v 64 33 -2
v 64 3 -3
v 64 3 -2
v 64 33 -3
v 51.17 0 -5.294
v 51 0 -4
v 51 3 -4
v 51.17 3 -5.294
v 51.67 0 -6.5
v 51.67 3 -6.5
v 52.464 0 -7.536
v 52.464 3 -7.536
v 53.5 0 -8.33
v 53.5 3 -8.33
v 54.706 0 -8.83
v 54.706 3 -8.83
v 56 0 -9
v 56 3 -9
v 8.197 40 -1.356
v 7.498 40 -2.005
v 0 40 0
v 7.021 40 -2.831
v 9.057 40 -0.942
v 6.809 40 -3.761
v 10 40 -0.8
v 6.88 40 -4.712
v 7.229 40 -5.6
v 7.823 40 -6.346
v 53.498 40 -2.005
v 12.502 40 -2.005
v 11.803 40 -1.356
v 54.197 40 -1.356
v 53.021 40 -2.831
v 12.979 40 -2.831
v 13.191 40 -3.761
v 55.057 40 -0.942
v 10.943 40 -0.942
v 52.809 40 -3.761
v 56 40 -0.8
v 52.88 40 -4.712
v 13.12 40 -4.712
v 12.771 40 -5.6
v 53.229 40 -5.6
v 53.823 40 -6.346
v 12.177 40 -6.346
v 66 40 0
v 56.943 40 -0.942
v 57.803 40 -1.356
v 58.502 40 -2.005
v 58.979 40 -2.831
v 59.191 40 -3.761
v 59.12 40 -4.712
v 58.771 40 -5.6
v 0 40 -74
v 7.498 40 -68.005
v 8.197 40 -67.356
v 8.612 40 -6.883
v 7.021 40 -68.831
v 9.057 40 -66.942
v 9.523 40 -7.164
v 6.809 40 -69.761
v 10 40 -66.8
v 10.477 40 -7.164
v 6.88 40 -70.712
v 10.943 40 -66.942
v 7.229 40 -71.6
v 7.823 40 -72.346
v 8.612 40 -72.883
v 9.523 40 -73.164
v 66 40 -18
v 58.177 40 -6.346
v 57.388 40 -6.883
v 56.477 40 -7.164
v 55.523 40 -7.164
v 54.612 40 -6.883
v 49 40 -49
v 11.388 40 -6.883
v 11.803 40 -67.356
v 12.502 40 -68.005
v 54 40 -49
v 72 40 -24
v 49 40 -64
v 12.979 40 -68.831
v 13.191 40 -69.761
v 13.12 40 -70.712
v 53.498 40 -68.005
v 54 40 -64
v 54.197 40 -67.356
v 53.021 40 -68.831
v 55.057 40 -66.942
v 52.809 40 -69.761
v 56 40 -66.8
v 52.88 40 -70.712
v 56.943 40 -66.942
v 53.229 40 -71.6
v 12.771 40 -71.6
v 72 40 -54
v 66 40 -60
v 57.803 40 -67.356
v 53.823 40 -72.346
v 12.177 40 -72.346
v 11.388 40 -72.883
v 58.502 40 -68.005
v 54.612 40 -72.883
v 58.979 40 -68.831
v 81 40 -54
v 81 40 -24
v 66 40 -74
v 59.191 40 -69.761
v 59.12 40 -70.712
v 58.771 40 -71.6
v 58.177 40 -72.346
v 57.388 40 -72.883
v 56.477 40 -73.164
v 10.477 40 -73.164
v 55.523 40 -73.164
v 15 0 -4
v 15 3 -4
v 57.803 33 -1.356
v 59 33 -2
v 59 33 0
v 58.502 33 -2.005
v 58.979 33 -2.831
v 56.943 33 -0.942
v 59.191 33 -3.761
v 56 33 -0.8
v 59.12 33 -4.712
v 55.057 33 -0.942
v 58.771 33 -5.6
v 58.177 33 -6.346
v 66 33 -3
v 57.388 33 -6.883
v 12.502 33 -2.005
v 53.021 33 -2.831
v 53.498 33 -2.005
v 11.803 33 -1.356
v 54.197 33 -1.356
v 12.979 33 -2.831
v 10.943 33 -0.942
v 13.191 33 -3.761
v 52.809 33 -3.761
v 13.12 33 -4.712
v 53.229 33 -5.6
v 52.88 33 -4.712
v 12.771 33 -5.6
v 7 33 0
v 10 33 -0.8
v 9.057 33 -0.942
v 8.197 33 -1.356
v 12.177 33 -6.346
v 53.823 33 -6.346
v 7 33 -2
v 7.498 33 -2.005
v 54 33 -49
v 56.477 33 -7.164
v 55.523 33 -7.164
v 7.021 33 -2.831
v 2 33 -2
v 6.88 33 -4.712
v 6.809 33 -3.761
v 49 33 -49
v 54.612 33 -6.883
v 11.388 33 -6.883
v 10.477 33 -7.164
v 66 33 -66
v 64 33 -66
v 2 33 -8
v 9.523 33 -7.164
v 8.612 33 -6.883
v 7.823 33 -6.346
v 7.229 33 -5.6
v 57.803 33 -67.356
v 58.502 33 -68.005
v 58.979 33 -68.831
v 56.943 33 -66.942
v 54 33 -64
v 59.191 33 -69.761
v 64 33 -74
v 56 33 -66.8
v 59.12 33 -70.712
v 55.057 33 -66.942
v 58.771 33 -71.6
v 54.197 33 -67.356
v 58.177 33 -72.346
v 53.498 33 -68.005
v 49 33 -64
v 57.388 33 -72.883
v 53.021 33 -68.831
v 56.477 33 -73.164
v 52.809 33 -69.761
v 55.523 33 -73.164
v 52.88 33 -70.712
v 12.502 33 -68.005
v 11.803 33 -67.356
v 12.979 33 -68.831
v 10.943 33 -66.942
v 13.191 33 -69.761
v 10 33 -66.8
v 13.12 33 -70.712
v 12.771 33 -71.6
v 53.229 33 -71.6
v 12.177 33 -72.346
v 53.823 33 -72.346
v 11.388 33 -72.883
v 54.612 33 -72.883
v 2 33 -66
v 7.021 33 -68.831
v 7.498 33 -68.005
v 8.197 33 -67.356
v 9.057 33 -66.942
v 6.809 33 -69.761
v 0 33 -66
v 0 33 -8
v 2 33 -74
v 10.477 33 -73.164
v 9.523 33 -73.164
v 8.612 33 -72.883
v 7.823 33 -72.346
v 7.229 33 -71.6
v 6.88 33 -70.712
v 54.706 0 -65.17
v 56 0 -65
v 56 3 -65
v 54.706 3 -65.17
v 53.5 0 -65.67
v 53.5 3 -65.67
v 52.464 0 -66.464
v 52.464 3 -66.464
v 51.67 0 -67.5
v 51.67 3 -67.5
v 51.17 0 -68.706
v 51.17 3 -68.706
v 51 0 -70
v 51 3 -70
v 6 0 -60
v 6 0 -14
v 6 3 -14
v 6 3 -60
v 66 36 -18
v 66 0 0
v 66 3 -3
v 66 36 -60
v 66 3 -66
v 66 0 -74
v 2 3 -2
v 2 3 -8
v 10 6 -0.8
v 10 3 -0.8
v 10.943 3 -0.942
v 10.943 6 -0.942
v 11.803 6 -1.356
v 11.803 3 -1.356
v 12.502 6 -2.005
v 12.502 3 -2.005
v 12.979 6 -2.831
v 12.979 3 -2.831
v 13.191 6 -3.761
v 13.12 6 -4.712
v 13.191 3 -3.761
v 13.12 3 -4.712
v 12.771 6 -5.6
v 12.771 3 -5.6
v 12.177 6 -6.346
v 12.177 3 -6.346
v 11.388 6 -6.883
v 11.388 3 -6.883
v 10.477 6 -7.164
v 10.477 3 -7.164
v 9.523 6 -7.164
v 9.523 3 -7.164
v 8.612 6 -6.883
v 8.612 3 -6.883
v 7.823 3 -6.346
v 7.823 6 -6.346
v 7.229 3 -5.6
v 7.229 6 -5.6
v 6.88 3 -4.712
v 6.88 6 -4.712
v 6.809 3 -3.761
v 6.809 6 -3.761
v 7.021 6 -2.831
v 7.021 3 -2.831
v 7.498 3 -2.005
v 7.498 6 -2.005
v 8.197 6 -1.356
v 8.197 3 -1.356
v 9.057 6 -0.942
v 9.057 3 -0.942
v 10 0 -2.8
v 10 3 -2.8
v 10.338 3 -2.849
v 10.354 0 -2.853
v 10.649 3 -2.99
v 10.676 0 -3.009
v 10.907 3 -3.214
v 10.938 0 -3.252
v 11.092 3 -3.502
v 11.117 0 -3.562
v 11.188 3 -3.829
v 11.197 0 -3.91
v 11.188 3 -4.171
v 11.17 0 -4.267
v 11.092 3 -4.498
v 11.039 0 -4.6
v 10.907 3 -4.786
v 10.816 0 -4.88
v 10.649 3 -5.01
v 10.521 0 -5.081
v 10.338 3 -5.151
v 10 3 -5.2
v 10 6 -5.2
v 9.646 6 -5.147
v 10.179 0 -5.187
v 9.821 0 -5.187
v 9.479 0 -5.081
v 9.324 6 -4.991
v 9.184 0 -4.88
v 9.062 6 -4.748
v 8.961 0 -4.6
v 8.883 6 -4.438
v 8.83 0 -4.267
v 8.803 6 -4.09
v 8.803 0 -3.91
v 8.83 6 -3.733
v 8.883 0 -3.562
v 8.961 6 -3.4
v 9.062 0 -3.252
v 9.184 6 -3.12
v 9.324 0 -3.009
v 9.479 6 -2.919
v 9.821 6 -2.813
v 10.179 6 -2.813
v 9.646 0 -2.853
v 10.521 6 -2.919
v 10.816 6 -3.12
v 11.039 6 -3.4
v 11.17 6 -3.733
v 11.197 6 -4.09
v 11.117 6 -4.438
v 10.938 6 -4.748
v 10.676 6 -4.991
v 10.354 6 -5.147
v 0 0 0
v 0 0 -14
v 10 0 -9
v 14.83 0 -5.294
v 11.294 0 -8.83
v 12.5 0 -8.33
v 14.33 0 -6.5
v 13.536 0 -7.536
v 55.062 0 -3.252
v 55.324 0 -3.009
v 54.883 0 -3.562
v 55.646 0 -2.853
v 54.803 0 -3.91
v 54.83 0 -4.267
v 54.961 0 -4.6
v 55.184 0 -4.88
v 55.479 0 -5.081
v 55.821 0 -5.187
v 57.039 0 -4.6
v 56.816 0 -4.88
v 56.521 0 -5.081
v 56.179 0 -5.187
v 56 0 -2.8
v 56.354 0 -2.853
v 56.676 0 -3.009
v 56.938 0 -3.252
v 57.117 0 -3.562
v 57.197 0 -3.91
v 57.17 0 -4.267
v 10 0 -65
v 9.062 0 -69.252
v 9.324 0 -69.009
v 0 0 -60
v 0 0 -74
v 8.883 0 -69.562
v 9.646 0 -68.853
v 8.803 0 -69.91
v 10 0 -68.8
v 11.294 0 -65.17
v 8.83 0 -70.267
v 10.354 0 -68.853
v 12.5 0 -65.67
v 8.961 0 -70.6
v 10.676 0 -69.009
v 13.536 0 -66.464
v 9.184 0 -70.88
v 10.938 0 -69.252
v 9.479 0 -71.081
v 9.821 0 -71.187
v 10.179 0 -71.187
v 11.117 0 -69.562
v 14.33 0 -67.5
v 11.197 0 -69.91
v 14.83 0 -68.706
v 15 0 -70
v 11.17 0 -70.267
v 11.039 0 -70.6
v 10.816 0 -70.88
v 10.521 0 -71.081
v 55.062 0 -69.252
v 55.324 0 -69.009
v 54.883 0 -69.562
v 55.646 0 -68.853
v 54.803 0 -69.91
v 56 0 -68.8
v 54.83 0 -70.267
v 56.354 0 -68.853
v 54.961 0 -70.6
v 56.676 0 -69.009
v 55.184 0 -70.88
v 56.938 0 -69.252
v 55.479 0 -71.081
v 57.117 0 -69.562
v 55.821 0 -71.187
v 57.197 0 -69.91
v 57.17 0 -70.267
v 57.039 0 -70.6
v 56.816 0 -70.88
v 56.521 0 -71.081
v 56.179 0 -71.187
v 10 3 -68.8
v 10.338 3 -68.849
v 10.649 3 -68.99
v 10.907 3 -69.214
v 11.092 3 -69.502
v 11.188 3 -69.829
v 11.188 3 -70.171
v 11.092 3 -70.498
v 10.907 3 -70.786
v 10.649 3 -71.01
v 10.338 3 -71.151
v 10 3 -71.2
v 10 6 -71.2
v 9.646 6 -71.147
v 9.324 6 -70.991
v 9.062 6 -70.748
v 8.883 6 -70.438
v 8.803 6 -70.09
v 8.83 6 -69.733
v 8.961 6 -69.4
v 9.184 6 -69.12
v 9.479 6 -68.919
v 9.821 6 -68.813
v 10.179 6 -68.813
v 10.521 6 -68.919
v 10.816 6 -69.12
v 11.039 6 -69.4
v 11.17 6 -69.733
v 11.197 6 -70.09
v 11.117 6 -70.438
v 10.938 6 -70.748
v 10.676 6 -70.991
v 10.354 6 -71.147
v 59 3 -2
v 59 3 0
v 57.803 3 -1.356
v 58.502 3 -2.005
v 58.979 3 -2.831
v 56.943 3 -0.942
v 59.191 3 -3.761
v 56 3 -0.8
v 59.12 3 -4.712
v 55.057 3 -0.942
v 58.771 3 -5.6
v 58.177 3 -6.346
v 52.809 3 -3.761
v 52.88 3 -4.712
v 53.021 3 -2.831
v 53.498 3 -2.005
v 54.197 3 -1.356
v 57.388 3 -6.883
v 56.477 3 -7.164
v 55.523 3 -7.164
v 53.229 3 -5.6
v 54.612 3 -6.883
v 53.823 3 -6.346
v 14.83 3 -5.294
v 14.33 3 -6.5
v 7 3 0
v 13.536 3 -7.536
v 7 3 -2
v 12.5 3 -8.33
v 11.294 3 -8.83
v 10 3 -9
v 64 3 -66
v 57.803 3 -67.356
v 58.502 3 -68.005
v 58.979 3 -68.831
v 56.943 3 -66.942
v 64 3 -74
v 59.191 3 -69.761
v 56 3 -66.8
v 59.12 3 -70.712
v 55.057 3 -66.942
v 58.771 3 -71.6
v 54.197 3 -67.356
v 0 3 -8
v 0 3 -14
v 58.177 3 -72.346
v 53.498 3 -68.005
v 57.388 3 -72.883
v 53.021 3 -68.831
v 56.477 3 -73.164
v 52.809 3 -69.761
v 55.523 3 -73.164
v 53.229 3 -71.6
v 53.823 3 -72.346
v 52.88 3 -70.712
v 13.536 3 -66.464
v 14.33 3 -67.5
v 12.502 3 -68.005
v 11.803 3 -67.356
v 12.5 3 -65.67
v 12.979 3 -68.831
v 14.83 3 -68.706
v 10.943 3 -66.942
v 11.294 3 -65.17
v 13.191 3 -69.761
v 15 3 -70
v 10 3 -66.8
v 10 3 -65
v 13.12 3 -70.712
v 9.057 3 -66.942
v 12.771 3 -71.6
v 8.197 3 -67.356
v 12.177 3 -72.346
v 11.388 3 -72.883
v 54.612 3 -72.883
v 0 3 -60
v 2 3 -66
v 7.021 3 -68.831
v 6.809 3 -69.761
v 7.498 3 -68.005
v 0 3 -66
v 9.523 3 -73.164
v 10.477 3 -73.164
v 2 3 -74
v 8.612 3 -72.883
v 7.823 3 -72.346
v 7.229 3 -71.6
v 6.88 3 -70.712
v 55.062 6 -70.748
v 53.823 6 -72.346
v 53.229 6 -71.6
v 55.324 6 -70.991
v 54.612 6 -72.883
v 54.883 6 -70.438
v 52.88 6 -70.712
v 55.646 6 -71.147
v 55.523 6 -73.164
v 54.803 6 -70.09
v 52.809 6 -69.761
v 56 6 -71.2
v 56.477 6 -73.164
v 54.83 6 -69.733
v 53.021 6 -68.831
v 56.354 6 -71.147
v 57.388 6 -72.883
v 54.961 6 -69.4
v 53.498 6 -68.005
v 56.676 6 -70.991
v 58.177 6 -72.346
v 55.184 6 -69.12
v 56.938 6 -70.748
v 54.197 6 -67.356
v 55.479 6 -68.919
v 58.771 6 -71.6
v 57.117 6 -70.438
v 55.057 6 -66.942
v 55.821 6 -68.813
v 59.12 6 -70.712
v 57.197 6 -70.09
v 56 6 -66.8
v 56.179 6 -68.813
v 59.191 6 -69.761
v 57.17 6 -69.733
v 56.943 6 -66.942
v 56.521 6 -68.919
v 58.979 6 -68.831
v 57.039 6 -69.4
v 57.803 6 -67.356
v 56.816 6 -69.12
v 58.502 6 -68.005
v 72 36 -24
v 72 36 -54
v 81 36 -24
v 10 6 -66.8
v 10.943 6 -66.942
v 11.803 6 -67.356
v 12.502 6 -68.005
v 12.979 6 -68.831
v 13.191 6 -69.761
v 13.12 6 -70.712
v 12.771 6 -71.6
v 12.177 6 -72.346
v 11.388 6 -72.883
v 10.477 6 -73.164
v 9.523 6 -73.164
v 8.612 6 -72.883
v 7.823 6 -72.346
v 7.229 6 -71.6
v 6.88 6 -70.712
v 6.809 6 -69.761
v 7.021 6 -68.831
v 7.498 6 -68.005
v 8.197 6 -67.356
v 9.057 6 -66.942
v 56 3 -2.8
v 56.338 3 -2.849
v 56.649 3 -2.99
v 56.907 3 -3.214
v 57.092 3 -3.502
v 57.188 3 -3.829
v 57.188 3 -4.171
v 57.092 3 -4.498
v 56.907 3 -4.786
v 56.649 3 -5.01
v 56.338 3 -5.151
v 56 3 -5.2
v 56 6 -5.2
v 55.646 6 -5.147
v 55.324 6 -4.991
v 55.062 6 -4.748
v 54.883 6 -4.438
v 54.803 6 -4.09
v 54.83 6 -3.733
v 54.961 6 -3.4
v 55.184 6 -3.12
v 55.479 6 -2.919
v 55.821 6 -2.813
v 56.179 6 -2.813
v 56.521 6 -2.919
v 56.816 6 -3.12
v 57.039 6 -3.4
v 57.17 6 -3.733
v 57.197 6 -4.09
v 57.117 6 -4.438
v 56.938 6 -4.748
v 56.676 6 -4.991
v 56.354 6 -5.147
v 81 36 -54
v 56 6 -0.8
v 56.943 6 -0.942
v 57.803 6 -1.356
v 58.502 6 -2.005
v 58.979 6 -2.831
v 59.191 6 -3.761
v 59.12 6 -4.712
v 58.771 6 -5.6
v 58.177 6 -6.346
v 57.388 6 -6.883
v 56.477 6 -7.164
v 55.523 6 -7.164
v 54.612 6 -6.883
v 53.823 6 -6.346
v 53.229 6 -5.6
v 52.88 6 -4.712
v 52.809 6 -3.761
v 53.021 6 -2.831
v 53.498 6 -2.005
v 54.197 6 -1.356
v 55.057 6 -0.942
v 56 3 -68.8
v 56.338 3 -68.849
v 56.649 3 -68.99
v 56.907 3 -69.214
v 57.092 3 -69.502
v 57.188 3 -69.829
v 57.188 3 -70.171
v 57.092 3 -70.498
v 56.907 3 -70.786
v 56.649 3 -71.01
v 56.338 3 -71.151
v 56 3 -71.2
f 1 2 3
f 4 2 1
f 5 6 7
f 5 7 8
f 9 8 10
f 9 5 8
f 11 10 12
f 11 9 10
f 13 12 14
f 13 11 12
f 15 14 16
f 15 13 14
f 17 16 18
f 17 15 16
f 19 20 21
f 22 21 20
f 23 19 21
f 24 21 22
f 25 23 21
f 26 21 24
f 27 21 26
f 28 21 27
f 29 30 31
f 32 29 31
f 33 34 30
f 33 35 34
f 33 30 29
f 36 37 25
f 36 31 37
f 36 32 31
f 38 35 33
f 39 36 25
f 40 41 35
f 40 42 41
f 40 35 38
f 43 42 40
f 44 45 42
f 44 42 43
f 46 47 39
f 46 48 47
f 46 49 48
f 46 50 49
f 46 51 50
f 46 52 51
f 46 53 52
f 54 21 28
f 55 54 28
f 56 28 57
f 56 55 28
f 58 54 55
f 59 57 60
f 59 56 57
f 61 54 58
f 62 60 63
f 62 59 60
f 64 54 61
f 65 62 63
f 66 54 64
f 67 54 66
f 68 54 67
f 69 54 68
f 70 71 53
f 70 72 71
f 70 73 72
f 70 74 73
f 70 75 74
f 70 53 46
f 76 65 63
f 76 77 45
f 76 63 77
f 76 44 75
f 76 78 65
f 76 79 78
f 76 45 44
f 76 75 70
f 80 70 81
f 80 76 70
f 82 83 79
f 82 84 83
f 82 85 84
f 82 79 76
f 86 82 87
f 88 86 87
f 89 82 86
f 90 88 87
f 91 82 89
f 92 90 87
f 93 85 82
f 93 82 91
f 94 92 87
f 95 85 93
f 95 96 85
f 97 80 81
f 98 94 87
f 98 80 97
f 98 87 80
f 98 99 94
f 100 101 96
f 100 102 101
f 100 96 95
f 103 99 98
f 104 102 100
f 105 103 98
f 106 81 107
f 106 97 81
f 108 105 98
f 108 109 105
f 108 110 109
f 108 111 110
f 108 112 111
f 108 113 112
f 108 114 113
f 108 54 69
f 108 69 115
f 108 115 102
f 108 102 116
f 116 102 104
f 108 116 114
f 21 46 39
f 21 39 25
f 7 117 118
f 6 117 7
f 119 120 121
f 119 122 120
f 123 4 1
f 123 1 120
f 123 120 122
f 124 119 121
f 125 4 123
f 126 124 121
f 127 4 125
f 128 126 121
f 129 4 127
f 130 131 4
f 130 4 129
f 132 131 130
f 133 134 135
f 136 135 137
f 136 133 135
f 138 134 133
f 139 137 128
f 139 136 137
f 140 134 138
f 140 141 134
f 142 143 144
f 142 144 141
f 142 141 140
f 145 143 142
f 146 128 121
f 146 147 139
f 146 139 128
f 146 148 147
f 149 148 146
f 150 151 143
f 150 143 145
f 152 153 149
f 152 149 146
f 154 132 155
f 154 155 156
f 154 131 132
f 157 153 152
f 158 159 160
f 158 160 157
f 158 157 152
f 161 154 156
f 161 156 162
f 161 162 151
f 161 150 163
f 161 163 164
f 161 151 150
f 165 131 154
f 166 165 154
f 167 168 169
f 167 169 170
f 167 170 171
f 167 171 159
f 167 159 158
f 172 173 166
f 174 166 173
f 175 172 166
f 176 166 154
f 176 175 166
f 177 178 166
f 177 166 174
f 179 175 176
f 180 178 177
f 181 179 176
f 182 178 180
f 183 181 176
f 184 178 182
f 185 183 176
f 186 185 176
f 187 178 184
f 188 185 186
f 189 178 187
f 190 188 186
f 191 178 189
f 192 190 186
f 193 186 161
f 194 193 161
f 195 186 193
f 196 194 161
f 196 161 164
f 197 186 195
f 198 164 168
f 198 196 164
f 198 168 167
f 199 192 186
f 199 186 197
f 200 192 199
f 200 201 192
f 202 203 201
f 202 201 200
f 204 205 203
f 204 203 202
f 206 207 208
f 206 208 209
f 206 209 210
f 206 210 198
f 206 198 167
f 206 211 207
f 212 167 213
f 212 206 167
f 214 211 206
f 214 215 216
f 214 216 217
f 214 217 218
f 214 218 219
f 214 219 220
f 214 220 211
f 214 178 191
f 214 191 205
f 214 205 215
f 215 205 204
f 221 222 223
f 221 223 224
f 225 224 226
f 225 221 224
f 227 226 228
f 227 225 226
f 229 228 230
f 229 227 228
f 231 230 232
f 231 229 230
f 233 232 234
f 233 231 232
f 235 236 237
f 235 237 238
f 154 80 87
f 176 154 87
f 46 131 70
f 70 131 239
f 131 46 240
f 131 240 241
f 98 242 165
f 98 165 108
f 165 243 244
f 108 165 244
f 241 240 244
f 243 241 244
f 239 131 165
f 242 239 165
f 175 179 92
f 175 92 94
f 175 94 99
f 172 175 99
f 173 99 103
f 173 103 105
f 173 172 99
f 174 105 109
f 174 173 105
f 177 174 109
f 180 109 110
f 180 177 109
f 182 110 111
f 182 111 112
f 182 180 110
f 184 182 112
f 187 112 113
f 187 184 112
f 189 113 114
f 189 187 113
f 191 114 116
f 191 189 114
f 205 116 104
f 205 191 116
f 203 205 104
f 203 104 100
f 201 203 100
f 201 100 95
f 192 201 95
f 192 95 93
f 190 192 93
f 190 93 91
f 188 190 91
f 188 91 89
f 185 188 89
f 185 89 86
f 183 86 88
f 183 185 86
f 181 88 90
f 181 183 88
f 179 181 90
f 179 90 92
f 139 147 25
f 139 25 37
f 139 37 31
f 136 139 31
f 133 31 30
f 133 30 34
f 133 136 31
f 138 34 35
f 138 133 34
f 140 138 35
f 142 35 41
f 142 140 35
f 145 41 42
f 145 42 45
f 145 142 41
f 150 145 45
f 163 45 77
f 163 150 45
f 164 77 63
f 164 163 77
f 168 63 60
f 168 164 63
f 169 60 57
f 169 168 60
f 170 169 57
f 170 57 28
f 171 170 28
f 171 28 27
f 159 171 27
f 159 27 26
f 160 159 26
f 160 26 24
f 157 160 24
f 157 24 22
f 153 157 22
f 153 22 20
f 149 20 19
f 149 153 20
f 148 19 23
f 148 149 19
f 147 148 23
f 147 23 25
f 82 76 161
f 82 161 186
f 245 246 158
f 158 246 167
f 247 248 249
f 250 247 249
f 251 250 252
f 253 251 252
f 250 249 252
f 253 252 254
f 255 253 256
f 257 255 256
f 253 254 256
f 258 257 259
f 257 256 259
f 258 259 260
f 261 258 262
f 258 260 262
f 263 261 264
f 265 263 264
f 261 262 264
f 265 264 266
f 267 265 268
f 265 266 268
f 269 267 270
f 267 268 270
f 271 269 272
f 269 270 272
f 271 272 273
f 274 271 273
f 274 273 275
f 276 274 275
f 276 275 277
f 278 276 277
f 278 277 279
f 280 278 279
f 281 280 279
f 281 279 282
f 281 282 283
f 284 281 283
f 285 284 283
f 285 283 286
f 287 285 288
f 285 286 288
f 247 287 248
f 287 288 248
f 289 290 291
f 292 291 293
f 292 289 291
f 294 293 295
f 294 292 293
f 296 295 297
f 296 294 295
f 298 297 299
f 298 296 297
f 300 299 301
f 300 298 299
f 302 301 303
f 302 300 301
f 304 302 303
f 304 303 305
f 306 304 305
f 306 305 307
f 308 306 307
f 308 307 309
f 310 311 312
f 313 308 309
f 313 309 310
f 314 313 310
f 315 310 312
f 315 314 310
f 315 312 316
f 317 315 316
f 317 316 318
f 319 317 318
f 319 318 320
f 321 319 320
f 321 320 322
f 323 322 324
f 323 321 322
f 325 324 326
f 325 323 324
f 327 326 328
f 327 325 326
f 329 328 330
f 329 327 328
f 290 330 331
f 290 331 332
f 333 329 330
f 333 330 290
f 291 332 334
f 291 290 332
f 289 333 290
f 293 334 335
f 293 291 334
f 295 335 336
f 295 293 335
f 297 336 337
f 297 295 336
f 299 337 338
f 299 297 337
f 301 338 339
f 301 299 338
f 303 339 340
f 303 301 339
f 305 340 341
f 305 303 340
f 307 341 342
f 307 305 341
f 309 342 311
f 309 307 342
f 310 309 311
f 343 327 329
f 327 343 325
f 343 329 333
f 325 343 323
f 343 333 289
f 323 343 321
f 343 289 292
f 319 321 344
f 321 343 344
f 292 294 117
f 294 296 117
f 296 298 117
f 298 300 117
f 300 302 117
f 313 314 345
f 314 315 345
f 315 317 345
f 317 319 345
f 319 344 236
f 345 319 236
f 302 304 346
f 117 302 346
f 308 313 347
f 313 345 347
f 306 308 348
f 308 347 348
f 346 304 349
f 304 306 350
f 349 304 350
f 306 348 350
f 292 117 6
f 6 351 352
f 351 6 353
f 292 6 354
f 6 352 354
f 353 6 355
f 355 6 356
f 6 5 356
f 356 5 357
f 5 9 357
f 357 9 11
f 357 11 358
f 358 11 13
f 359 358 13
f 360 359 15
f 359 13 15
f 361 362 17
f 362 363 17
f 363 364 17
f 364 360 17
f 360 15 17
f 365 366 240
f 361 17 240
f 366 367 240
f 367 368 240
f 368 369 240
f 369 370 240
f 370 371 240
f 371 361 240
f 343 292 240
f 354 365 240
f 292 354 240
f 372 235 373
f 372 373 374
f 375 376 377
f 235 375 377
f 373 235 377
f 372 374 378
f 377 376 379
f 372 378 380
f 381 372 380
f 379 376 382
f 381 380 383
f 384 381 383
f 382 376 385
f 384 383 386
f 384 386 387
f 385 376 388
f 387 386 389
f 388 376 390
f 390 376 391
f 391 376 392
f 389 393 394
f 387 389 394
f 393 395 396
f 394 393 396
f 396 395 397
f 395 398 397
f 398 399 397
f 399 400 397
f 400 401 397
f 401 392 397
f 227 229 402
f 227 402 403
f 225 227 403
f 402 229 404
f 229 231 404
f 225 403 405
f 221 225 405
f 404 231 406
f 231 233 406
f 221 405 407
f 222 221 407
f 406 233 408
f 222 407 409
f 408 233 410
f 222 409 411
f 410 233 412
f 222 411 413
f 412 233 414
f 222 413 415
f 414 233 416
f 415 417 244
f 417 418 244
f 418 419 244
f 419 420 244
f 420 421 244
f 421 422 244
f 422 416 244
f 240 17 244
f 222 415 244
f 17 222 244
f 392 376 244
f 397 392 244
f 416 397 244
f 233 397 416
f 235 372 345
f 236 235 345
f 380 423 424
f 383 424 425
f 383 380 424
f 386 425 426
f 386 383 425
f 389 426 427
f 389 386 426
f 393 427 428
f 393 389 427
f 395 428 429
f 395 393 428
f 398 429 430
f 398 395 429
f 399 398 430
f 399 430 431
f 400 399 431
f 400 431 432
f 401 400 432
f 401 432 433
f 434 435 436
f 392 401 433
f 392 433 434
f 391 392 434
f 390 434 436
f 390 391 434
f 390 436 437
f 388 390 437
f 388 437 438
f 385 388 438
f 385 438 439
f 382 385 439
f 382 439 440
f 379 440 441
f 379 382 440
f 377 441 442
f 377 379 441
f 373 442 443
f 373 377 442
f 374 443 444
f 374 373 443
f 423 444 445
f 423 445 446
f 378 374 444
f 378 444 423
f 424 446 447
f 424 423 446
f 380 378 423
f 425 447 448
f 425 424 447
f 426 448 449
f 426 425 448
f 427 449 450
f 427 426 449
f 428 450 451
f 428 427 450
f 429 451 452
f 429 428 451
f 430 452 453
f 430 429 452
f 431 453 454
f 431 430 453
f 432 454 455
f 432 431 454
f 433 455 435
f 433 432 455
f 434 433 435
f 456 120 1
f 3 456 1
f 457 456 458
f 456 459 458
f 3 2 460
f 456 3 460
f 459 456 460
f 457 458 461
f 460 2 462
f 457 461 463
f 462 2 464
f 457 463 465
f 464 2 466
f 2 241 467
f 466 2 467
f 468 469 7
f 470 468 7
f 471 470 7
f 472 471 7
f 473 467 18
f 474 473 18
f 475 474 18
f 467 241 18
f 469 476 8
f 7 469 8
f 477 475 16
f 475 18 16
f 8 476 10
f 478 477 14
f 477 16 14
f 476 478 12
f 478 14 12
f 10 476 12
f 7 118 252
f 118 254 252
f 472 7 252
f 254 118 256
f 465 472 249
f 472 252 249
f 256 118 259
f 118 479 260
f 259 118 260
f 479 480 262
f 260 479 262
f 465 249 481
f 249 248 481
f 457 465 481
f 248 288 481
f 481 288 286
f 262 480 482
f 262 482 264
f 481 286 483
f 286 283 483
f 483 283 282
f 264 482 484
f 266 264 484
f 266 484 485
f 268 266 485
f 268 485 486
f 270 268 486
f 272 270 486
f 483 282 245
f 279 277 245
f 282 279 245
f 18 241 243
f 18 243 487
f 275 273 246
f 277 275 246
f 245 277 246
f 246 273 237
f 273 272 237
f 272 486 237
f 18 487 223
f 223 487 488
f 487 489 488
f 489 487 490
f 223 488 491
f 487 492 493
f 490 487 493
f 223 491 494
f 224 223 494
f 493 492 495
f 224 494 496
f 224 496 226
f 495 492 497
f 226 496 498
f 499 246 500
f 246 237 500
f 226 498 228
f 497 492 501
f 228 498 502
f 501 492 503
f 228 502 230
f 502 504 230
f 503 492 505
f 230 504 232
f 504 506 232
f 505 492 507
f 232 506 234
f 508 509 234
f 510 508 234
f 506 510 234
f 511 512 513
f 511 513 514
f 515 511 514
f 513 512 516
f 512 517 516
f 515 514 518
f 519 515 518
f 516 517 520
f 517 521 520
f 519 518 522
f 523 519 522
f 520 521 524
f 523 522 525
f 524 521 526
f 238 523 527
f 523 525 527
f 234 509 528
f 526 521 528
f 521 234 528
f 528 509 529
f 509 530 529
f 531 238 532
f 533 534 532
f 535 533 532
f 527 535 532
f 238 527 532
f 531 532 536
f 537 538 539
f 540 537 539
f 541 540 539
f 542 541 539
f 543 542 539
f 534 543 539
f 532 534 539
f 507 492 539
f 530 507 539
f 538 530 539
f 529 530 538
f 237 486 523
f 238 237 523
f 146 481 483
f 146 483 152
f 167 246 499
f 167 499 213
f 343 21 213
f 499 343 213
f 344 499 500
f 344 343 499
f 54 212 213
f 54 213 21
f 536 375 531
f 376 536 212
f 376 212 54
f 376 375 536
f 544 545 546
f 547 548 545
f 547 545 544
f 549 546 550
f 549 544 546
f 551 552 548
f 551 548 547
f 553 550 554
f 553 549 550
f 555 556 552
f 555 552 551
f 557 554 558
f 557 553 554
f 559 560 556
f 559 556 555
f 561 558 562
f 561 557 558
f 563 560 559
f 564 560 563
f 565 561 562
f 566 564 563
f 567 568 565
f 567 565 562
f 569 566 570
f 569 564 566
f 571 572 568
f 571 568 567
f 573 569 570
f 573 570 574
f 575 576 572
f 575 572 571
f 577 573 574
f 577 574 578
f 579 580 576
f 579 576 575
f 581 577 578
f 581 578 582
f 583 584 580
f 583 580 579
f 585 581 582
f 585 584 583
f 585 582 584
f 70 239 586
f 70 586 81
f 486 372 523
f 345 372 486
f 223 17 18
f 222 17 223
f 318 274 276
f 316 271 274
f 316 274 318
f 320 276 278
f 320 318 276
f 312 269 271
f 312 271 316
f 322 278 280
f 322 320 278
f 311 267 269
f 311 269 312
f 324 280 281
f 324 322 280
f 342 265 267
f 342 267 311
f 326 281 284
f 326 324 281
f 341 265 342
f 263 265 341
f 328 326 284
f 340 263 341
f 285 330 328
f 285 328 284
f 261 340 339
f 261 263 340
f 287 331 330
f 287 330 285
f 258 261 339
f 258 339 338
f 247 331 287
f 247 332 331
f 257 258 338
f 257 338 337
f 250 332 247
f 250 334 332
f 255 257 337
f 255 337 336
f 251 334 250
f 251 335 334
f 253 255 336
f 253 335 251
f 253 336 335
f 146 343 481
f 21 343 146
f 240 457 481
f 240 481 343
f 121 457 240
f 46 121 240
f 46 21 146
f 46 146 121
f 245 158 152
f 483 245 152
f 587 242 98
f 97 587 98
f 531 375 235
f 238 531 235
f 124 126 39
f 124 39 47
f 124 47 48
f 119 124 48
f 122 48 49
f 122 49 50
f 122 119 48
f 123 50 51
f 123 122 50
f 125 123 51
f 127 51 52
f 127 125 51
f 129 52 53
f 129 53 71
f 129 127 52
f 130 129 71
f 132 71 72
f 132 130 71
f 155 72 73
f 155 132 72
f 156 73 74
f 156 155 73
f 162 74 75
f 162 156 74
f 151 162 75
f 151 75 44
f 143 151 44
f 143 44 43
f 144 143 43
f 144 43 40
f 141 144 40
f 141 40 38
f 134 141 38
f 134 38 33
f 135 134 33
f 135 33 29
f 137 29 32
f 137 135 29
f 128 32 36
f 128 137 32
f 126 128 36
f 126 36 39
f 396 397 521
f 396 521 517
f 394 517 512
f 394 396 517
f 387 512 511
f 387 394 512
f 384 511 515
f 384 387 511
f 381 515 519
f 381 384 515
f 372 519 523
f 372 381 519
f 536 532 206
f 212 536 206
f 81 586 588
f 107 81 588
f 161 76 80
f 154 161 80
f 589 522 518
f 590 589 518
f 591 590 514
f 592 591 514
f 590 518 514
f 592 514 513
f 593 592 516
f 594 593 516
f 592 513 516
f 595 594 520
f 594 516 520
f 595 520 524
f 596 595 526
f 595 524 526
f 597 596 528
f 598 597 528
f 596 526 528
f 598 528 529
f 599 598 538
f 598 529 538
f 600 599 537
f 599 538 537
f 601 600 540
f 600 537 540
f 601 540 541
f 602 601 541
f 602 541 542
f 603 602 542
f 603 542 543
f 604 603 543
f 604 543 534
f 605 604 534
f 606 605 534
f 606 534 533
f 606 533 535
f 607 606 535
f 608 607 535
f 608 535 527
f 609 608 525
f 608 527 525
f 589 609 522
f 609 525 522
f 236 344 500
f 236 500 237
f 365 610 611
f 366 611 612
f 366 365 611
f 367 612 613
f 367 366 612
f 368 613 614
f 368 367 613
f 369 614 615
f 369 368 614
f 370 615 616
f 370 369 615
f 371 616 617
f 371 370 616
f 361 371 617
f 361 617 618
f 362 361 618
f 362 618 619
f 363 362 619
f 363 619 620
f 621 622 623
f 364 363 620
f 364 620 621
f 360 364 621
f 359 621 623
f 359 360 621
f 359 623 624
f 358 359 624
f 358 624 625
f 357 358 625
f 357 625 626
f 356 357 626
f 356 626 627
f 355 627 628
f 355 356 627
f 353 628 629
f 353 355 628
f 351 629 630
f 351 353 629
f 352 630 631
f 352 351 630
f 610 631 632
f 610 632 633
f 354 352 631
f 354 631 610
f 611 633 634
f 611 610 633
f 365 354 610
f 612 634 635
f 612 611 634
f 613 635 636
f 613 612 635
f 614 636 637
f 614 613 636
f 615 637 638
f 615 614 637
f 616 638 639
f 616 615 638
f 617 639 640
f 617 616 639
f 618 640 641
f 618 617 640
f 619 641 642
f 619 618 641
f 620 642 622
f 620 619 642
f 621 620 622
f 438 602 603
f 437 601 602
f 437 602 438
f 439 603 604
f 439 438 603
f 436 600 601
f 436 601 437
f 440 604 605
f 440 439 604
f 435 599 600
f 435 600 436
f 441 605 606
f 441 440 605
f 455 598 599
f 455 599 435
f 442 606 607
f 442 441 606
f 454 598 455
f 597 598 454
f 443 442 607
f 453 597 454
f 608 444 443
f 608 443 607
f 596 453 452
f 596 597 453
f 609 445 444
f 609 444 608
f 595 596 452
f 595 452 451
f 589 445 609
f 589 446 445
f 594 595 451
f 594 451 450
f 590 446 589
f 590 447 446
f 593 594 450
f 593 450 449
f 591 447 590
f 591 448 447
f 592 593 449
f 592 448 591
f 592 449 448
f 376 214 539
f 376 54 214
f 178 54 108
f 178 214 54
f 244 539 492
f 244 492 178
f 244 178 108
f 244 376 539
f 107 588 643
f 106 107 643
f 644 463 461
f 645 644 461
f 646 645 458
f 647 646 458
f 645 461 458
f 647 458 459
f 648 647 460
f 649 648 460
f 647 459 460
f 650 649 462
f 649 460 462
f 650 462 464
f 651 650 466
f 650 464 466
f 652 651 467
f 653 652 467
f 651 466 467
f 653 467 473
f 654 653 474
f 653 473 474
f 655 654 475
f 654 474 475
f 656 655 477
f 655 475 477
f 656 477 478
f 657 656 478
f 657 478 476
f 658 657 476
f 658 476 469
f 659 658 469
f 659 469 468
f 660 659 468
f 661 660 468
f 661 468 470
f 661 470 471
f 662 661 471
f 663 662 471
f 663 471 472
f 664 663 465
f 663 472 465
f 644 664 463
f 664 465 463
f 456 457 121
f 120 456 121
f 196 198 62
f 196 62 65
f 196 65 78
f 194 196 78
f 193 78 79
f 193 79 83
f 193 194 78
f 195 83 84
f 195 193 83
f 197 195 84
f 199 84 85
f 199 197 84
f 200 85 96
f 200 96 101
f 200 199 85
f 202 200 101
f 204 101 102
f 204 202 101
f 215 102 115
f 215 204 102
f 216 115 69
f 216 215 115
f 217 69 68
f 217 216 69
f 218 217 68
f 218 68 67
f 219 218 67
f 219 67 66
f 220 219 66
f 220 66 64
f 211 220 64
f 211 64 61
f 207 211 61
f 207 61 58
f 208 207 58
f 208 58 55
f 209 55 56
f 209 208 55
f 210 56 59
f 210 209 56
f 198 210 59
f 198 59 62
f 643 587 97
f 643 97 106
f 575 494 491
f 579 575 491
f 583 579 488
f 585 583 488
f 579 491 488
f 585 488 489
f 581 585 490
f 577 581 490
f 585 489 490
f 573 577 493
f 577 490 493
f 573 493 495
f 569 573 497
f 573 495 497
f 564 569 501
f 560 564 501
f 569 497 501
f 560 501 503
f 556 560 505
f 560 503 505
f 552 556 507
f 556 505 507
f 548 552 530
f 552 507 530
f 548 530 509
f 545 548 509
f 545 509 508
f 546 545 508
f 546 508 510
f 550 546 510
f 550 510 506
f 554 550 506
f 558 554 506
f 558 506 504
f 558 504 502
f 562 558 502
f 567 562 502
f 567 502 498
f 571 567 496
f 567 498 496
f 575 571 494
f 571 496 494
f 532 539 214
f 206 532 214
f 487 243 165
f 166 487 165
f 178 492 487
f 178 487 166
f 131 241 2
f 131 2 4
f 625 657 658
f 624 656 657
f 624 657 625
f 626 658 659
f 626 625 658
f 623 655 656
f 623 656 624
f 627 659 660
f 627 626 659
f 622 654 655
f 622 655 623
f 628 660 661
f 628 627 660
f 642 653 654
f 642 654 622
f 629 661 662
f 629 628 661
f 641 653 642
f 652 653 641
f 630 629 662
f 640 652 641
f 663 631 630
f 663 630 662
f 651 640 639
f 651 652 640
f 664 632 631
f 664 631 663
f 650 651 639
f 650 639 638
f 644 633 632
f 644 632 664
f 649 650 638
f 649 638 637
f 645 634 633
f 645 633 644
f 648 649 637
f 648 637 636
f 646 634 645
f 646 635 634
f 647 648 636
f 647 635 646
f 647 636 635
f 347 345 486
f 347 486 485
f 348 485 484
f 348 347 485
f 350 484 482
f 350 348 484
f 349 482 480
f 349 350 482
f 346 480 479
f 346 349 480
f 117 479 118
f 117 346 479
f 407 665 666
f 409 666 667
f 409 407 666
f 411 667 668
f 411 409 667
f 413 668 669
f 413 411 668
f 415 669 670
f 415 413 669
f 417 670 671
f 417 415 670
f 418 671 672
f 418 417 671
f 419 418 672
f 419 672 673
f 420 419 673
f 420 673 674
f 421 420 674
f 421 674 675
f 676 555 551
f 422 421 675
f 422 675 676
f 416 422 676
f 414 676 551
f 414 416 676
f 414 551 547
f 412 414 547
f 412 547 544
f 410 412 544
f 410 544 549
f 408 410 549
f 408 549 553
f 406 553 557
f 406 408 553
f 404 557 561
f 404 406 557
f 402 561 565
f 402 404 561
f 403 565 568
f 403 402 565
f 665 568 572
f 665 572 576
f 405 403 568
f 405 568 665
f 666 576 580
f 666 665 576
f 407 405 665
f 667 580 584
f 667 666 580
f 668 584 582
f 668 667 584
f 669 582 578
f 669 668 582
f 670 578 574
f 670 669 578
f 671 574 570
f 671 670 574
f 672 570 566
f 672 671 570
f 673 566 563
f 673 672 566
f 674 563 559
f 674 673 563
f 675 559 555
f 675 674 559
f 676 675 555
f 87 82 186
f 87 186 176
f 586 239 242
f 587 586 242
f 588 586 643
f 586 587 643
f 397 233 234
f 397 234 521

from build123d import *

# Parameters (mm, degrees)
SKETCH1_W                             = 66
SKETCH1_H                             = 74
SKETCH1_R                             = 1.2
MAIN_OUTER_CONNECTION_DEPTH           = 40
SKETCH2_W                             = 62
SKETCH2_H                             = 30
HOLE_FOR_PROTOBOARD_ACCESS_DEPTH      = 107.920531237
SKETCH16_W                            = 5
SKETCH16_H                            = 30
WALL_FOR_SCREW_TERMINAL_REPLACE_DEPTH = 2
SKETCH18_W                            = 58
SKETCH18_H                            = 30
HOLE_FOR_WIRE_CONNECTIONS_DEPTH       = 107.920531237
HOLE_FOR_SCREW_TERMINAL_REPLACE_REACH = 108.921
SKETCH18_3_W                          = 5
SKETCH18_3_H                          = 30
SKETCH1_3_W                           = 6
SKETCH1_3_H                           = 46
HOLE_FOR_WIRE_IN_BOTTOM_DEPTH         = 10
BOLT_START                            = 33
SKETCH1_5_R                           = 3.2
SKETCH1_5_R_2                         = 1.2
BOLT_HEAD_CLEARANCE_DEPTH             = 7
STANDOFF_START                        = 3
SKETCH1_6_R                           = 3.2
SKETCH1_6_R_2                         = 1.2
STANDOFF_FOR_WIRE_CLEARANCE_DEPTH     = 3
BREAKOUT_START                        = 36
SKETCH1_8_W                           = 15
SKETCH1_8_H                           = 30
BREAKOUT_BOARD_COVER_DEPTH            = 4
CUT_EXTRUDE14_START                   = 40
SKETCH1_9_W                           = 5
SKETCH1_9_H                           = 15
CUT_EXTRUDE14_DEPTH                   = 7
CHAMFER2_SIZE                         = 6


with BuildPart() as part:
    # Sketch1 → Main Outer Connection (new body)
    with BuildSketch(Plane(origin=(0, 0, 0), x_dir=(1, 0, 0), z_dir=(0, 1, 0))):
        with Locations((33, 37)):
            Rectangle(SKETCH1_W, SKETCH1_H)
        with Locations(Location((10, 70, 0), (0, 0, 270))):
            Circle(SKETCH1_R, mode=Mode.SUBTRACT)
        with Locations(Location((56, 70, 0), (0, 0, 270))):
            Circle(SKETCH1_R, mode=Mode.SUBTRACT)
        with Locations(Location((10, 4, 0), (0, 0, 270))):
            Circle(SKETCH1_R, mode=Mode.SUBTRACT)
        with Locations(Location((56, 4, 0), (0, 0, 270))):
            Circle(SKETCH1_R, mode=Mode.SUBTRACT)
    extrude(amount=MAIN_OUTER_CONNECTION_DEPTH)

    # Sketch2 → Hole for Protoboard Access (cut, through all)
    with BuildSketch(Plane(origin=(0, 0, -74), x_dir=(-1, 0, 0), z_dir=(0, 0, -1))):
        with Locations((-33, 18)):
            Rectangle(SKETCH2_W, SKETCH2_H)
    extrude(amount=-HOLE_FOR_PROTOBOARD_ACCESS_DEPTH, mode=Mode.SUBTRACT)

    # Sketch16 → Wall for Screw Terminal Replace (add)
    with BuildSketch(Plane.XY):
        with Locations((61.5, 18)):
            Rectangle(SKETCH16_W, SKETCH16_H)
        with Locations((4.5, 18)):
            Rectangle(SKETCH16_W, SKETCH16_H)
    extrude(amount=-WALL_FOR_SCREW_TERMINAL_REPLACE_DEPTH)

    # Sketch18 → Hole for Wire Connections (cut, through all)
    with BuildSketch(Plane(origin=(66, 0, 0), x_dir=(0, 0, -1), z_dir=(1, 0, 0))):
        with Locations((37, 18)):
            Rectangle(SKETCH18_W, SKETCH18_H)
    extrude(amount=-HOLE_FOR_WIRE_CONNECTIONS_DEPTH, mode=Mode.SUBTRACT)

    # Sketch18<3> → Hole for Screw Terminal Replace (cut, up to next)
    with BuildSketch(Plane(origin=(66, 0, 0), x_dir=(0, 0, -1), z_dir=(1, 0, 0)), mode=Mode.PRIVATE) as hole_for_screw_terminal_replace_sk1:
        with Locations((5.5, 18)):
            Rectangle(SKETCH18_3_W, SKETCH18_3_H)
    hole_for_screw_terminal_replace_tool1 = extrude(hole_for_screw_terminal_replace_sk1.sketch, amount=-HOLE_FOR_SCREW_TERMINAL_REPLACE_REACH, mode=Mode.PRIVATE) & part.part
    add(hole_for_screw_terminal_replace_tool1.solids().sort_by_distance((66, 18, -5.5))[0], mode=Mode.SUBTRACT)

    # Sketch1<3> → Hole for Wire in Bottom (cut)
    with BuildSketch(Plane(origin=(0, 0, 0), x_dir=(1, 0, 0), z_dir=(0, 1, 0))):
        with Locations((3, 37)):
            Rectangle(SKETCH1_3_W, SKETCH1_3_H)
        with BuildLine():
            Line((51, 70), (15, 70))
            ThreePointArc((15, 70), (13.535533906, 66.464466094), (10, 65))
            Line((10, 65), (10, 9))
            ThreePointArc((10, 9), (13.535533906, 7.535533906), (15, 4))
            Line((15, 4), (51, 4))
            ThreePointArc((51, 4), (52.464466094, 7.535533906), (56, 9))
            Line((56, 9), (56, 65))
            ThreePointArc((56, 65), (52.464466094, 66.464466094), (51, 70))
        make_face()
    extrude(amount=HOLE_FOR_WIRE_IN_BOTTOM_DEPTH, mode=Mode.SUBTRACT)

    # Sketch1<5> → Bolt Head Clearance (cut)
    # profile 1 of 4: a face of its own
    with BuildSketch(Plane(origin=(0, 0, 0), x_dir=(1, 0, 0), z_dir=(0, 1, 0)).offset(BOLT_START)):
        with Locations(Location((56, 4, 0), (0, 0, 270))):
            Circle(SKETCH1_5_R)
        with Locations(Location((56, 4, 0), (0, 0, 90))):
            Circle(SKETCH1_5_R_2, mode=Mode.SUBTRACT)
    # profile 2 of 4: a face of its own
    with BuildSketch(Plane(origin=(0, 0, 0), x_dir=(1, 0, 0), z_dir=(0, 1, 0)).offset(BOLT_START)):
        with Locations(Location((10, 4, 0), (0, 0, 270))):
            Circle(SKETCH1_5_R)
        with Locations(Location((10, 4, 0), (0, 0, 90))):
            Circle(SKETCH1_5_R_2, mode=Mode.SUBTRACT)
    # profile 3 of 4: a face of its own
    with BuildSketch(Plane(origin=(0, 0, 0), x_dir=(1, 0, 0), z_dir=(0, 1, 0)).offset(BOLT_START)):
        with Locations(Location((10, 70, 0), (0, 0, 270))):
            Circle(SKETCH1_5_R)
        with Locations(Location((10, 70, 0), (0, 0, 90))):
            Circle(SKETCH1_5_R_2, mode=Mode.SUBTRACT)
    # profile 4 of 4: a face of its own
    with BuildSketch(Plane(origin=(0, 0, 0), x_dir=(1, 0, 0), z_dir=(0, 1, 0)).offset(BOLT_START)):
        with Locations(Location((56, 70, 0), (0, 0, 270))):
            Circle(SKETCH1_5_R)
        with Locations(Location((56, 70, 0), (0, 0, 90))):
            Circle(SKETCH1_5_R_2, mode=Mode.SUBTRACT)
    extrude(amount=BOLT_HEAD_CLEARANCE_DEPTH, mode=Mode.SUBTRACT)

    # Sketch1<6> → Standoff for Wire Clearance (add)
    # profile 1 of 4: a face of its own
    with BuildSketch(Plane(origin=(0, 0, 0), x_dir=(1, 0, 0), z_dir=(0, 1, 0)).offset(STANDOFF_START)):
        with Locations(Location((10, 4, 0), (0, 0, 270))):
            Circle(SKETCH1_6_R)
        with Locations(Location((10, 4, 0), (0, 0, 90))):
            Circle(SKETCH1_6_R_2, mode=Mode.SUBTRACT)
    # profile 2 of 4: a face of its own
    with BuildSketch(Plane(origin=(0, 0, 0), x_dir=(1, 0, 0), z_dir=(0, 1, 0)).offset(STANDOFF_START)):
        with Locations(Location((56, 4, 0), (0, 0, 270))):
            Circle(SKETCH1_6_R)
        with Locations(Location((56, 4, 0), (0, 0, 90))):
            Circle(SKETCH1_6_R_2, mode=Mode.SUBTRACT)
    # profile 3 of 4: a face of its own
    with BuildSketch(Plane(origin=(0, 0, 0), x_dir=(1, 0, 0), z_dir=(0, 1, 0)).offset(STANDOFF_START)):
        with Locations(Location((56, 70, 0), (0, 0, 270))):
            Circle(SKETCH1_6_R)
        with Locations(Location((56, 70, 0), (0, 0, 90))):
            Circle(SKETCH1_6_R_2, mode=Mode.SUBTRACT)
    # profile 4 of 4: a face of its own
    with BuildSketch(Plane(origin=(0, 0, 0), x_dir=(1, 0, 0), z_dir=(0, 1, 0)).offset(STANDOFF_START)):
        with Locations(Location((10, 70, 0), (0, 0, 270))):
            Circle(SKETCH1_6_R)
        with Locations(Location((10, 70, 0), (0, 0, 90))):
            Circle(SKETCH1_6_R_2, mode=Mode.SUBTRACT)
    extrude(amount=STANDOFF_FOR_WIRE_CLEARANCE_DEPTH)

    # Sketch1<8> → Breakout Board Cover (add)
    with BuildSketch(Plane(origin=(0, 0, 0), x_dir=(1, 0, 0), z_dir=(0, 1, 0)).offset(BREAKOUT_START)):
        with Locations((73.5, 39)):
            Rectangle(SKETCH1_8_W, SKETCH1_8_H)
    extrude(amount=BREAKOUT_BOARD_COVER_DEPTH)

    # Sketch1<9> → Cut-Extrude14 (cut)
    with BuildSketch(Plane(origin=(0, 0, 0), x_dir=(1, 0, 0), z_dir=(0, 1, 0)).offset(CUT_EXTRUDE14_START)):
        with Locations((51.5, 56.5)):
            Rectangle(SKETCH1_9_W, SKETCH1_9_H)
    extrude(amount=-CUT_EXTRUDE14_DEPTH, mode=Mode.SUBTRACT)

    # Chamfer2
    chamfer2_edges = [part.edges().sort_by_distance(p)[0] for p in [
        (66, 38, -24),
        (66, 38, -54),
    ]]
    chamfer(chamfer2_edges, length=CHAMFER2_SIZE)


solid = part.part
